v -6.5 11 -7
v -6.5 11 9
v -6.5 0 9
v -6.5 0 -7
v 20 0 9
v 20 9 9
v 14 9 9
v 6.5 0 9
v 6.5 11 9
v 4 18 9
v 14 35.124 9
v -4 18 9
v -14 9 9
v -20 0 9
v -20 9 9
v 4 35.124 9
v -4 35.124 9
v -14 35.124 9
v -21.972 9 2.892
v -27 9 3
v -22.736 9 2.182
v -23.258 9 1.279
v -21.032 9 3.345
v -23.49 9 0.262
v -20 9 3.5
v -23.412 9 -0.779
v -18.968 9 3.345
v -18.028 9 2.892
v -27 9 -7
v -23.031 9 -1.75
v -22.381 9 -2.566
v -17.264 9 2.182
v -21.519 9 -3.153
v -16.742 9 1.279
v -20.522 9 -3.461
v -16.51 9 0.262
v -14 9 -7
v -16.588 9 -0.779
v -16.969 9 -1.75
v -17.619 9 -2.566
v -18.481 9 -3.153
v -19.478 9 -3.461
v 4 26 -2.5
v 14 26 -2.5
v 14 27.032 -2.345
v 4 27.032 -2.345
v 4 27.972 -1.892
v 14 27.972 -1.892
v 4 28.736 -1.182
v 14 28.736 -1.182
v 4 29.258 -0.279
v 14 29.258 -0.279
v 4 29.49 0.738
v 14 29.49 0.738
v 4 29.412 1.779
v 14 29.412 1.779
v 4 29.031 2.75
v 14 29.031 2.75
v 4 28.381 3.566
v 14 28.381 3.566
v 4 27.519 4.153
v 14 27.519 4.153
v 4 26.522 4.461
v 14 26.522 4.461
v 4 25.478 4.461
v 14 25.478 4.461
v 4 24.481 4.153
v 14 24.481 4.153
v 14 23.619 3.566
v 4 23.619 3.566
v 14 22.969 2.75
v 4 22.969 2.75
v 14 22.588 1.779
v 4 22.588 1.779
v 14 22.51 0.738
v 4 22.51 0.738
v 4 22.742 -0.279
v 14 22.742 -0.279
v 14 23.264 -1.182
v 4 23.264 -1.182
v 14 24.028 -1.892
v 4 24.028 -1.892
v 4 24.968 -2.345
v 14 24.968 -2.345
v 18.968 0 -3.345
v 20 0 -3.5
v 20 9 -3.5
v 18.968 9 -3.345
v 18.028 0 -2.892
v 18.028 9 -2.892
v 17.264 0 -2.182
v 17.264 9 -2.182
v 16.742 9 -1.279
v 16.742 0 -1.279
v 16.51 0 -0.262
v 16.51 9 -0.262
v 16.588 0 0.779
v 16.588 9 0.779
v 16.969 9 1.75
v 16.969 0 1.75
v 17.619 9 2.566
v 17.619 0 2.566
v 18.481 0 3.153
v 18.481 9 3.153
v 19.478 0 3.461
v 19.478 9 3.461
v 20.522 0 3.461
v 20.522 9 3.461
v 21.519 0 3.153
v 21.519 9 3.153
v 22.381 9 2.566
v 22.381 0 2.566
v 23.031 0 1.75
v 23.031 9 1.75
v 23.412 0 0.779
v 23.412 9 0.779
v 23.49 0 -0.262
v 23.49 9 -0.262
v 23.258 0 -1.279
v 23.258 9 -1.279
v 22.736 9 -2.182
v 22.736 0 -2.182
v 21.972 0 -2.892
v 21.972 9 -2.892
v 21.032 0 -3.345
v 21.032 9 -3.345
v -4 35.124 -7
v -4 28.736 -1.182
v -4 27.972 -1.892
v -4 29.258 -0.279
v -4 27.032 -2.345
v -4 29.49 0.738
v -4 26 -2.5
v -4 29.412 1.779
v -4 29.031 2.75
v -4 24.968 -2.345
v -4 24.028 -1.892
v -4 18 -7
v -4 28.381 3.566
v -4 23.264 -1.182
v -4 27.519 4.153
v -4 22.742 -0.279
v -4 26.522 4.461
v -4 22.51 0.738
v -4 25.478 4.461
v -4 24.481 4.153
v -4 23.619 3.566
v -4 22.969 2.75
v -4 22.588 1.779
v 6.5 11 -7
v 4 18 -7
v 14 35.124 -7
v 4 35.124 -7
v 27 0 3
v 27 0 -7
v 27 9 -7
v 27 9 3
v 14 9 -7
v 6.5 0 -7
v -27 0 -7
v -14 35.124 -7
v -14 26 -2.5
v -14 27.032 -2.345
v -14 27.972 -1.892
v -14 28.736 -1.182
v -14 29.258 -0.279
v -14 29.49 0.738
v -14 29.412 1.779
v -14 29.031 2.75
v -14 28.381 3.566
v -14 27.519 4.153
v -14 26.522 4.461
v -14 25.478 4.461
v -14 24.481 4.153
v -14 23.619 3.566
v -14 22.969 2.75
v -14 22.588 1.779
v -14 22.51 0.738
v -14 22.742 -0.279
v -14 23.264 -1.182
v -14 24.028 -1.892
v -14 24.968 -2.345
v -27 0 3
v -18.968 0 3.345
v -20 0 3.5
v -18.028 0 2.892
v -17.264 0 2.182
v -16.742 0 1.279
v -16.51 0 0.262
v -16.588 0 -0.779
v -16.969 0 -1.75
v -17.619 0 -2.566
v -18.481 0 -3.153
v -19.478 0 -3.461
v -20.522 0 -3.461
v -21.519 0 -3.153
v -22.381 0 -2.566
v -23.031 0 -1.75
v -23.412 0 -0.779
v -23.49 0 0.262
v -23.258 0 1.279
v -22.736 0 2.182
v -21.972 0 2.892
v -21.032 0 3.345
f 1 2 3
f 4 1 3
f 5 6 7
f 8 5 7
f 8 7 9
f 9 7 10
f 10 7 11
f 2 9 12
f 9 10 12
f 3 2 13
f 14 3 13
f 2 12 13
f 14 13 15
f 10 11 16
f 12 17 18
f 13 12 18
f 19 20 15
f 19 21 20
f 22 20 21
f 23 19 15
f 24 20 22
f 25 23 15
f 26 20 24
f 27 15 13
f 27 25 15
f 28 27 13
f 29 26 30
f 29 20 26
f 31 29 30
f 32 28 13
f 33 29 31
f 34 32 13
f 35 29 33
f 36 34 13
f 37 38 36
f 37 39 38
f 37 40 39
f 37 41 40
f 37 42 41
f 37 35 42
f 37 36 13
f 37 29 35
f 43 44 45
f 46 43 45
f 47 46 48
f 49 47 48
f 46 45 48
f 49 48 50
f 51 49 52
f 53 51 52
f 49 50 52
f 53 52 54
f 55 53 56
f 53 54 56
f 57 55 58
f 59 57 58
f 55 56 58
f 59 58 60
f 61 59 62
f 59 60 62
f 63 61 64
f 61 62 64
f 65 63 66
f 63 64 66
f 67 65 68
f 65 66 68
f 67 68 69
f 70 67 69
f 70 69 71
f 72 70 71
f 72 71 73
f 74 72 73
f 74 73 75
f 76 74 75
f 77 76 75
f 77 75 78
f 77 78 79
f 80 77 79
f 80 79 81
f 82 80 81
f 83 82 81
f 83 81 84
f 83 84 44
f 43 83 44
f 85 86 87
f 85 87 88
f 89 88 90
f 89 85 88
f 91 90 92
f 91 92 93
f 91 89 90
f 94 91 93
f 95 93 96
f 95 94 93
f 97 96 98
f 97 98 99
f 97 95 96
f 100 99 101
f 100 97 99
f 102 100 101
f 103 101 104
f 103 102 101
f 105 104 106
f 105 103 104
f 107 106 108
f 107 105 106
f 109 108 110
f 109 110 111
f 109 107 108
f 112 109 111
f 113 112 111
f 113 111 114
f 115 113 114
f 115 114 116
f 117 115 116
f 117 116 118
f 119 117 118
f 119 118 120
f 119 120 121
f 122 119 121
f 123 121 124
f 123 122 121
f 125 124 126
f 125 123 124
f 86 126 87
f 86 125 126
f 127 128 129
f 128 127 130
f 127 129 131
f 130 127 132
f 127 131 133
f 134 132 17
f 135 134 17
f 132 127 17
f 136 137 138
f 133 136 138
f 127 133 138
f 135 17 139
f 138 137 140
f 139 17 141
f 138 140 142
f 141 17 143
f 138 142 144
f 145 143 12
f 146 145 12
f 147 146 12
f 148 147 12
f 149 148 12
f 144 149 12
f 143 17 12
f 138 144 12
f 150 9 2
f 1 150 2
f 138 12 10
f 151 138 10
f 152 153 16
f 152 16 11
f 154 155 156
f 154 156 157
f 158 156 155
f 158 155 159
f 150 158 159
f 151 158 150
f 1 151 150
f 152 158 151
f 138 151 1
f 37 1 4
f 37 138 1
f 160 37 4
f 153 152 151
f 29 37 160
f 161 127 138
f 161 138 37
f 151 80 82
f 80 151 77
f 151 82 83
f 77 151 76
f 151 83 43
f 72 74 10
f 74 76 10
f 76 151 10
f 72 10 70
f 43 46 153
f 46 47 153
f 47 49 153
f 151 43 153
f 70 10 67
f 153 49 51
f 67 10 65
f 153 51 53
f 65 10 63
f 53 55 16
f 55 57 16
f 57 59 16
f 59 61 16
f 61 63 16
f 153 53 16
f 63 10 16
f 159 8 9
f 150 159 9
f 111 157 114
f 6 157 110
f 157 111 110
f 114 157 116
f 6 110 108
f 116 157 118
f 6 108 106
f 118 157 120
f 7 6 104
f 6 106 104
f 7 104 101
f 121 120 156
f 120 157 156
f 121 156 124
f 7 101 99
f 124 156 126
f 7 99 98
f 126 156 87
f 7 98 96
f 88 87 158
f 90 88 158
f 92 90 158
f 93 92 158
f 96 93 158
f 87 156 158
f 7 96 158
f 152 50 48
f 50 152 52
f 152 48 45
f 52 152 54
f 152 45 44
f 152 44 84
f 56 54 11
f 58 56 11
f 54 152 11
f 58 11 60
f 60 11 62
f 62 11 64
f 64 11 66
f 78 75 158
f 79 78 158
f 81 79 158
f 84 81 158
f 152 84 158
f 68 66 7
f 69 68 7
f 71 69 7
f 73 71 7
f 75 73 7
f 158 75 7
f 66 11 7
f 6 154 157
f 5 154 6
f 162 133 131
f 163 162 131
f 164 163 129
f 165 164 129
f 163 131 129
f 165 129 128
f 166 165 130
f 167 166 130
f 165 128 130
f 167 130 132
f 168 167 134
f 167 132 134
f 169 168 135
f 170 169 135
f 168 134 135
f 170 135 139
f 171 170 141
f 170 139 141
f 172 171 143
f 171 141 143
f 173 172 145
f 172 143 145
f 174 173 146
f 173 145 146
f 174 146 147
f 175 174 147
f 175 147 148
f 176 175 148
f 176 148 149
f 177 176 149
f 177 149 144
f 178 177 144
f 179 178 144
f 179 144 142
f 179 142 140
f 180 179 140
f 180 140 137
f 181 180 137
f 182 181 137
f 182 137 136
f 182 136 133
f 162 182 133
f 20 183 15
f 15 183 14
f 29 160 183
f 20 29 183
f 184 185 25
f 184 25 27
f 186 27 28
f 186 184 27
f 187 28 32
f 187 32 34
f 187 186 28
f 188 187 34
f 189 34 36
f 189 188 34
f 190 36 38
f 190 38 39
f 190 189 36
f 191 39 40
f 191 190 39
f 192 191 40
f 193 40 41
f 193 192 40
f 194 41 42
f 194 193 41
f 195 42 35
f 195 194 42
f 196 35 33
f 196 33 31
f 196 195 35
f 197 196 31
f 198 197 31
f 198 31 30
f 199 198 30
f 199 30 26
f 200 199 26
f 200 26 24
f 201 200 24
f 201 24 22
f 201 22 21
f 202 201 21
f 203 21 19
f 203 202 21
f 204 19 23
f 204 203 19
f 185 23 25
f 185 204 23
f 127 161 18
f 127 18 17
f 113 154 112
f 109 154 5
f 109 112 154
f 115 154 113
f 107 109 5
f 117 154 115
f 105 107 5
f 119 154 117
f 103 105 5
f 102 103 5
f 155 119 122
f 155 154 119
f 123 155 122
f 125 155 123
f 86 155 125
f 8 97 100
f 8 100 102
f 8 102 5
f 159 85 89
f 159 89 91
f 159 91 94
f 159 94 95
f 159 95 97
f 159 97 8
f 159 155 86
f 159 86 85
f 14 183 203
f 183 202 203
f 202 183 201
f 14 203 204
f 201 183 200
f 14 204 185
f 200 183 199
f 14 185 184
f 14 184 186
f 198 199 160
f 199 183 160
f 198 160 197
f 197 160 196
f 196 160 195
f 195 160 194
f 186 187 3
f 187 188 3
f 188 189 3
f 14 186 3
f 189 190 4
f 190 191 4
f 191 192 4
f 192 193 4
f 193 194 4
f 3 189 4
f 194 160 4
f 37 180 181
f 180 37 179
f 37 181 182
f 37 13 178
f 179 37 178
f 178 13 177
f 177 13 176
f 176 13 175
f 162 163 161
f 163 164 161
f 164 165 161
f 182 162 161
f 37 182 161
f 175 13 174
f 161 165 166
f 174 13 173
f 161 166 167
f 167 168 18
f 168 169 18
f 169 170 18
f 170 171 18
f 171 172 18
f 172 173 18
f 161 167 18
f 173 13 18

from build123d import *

# Parameters (mm, degrees)
CROQUIS2_R                = 3.5
SALIENTE_EXTRUIR1_DEPTH   = 9
SALIENTE_EXTRUIR1_2_DEPTH = 9
SALIENTE_EXTRUIR2_DEPTH   = 16
CROQUIS4_R                = 3.5
CORTAR_EXTRUIR1_DEPTH     = 28


with BuildPart() as part:
    # Croquis2 → Saliente-Extruir1 (new body)
    with BuildSketch(Plane(origin=(0, 0, 0), x_dir=(1, 0, 0), z_dir=(0, 1, 0))):
        Polygon((-27, 7), (-27, -3), (-20, -9), (-6.5, -9), (-6.5, 7), align=None)
        with Locations(Location((-20, 0, 0), (0, 0, 270))):
            Circle(CROQUIS2_R, mode=Mode.SUBTRACT)
    extrude(amount=SALIENTE_EXTRUIR1_DEPTH)



with BuildPart() as body_2:
    # Croquis2 → Saliente-Extruir1 2 (new body)
    with BuildSketch(Plane(origin=(0, 0, 0), x_dir=(1, 0, 0), z_dir=(0, 1, 0))):
        Polygon((6.5, 7), (27, 7), (27, -3), (20, -9), (6.5, -9), align=None)
        with Locations(Location((20, 0, 0), (0, 0, 90))):
            Circle(CROQUIS2_R, mode=Mode.SUBTRACT)
    extrude(amount=SALIENTE_EXTRUIR1_2_DEPTH)


with BuildPart() as part_1:
    add(part.part)

    add(body_2.part)  # Saliente-Extruir2 merges body 2
    # Croquis3 → Saliente-Extruir2 (add)
    with BuildSketch(Plane.XY.offset(9)):
        Polygon((6.5, 9), (6.5, 11), (-6.5, 11), (-6.5, 9), (-14, 9), (-14, 35.124101005), (-4, 35.124101005), (-4, 18), (4, 18), (4, 35.124101005), (14, 35.124101005), (14, 9), align=None)
    extrude(amount=-SALIENTE_EXTRUIR2_DEPTH)

    # Croquis4 → Cortar-Extruir1 (cut)
    with BuildSketch(Plane(origin=(14, 0, 0), x_dir=(0, 0, -1), z_dir=(1, 0, 0))):
        with Locations((-1, 26)):
            Circle(CROQUIS4_R)
    extrude(amount=-CORTAR_EXTRUIR1_DEPTH, mode=Mode.SUBTRACT)


solid = part_1.part
